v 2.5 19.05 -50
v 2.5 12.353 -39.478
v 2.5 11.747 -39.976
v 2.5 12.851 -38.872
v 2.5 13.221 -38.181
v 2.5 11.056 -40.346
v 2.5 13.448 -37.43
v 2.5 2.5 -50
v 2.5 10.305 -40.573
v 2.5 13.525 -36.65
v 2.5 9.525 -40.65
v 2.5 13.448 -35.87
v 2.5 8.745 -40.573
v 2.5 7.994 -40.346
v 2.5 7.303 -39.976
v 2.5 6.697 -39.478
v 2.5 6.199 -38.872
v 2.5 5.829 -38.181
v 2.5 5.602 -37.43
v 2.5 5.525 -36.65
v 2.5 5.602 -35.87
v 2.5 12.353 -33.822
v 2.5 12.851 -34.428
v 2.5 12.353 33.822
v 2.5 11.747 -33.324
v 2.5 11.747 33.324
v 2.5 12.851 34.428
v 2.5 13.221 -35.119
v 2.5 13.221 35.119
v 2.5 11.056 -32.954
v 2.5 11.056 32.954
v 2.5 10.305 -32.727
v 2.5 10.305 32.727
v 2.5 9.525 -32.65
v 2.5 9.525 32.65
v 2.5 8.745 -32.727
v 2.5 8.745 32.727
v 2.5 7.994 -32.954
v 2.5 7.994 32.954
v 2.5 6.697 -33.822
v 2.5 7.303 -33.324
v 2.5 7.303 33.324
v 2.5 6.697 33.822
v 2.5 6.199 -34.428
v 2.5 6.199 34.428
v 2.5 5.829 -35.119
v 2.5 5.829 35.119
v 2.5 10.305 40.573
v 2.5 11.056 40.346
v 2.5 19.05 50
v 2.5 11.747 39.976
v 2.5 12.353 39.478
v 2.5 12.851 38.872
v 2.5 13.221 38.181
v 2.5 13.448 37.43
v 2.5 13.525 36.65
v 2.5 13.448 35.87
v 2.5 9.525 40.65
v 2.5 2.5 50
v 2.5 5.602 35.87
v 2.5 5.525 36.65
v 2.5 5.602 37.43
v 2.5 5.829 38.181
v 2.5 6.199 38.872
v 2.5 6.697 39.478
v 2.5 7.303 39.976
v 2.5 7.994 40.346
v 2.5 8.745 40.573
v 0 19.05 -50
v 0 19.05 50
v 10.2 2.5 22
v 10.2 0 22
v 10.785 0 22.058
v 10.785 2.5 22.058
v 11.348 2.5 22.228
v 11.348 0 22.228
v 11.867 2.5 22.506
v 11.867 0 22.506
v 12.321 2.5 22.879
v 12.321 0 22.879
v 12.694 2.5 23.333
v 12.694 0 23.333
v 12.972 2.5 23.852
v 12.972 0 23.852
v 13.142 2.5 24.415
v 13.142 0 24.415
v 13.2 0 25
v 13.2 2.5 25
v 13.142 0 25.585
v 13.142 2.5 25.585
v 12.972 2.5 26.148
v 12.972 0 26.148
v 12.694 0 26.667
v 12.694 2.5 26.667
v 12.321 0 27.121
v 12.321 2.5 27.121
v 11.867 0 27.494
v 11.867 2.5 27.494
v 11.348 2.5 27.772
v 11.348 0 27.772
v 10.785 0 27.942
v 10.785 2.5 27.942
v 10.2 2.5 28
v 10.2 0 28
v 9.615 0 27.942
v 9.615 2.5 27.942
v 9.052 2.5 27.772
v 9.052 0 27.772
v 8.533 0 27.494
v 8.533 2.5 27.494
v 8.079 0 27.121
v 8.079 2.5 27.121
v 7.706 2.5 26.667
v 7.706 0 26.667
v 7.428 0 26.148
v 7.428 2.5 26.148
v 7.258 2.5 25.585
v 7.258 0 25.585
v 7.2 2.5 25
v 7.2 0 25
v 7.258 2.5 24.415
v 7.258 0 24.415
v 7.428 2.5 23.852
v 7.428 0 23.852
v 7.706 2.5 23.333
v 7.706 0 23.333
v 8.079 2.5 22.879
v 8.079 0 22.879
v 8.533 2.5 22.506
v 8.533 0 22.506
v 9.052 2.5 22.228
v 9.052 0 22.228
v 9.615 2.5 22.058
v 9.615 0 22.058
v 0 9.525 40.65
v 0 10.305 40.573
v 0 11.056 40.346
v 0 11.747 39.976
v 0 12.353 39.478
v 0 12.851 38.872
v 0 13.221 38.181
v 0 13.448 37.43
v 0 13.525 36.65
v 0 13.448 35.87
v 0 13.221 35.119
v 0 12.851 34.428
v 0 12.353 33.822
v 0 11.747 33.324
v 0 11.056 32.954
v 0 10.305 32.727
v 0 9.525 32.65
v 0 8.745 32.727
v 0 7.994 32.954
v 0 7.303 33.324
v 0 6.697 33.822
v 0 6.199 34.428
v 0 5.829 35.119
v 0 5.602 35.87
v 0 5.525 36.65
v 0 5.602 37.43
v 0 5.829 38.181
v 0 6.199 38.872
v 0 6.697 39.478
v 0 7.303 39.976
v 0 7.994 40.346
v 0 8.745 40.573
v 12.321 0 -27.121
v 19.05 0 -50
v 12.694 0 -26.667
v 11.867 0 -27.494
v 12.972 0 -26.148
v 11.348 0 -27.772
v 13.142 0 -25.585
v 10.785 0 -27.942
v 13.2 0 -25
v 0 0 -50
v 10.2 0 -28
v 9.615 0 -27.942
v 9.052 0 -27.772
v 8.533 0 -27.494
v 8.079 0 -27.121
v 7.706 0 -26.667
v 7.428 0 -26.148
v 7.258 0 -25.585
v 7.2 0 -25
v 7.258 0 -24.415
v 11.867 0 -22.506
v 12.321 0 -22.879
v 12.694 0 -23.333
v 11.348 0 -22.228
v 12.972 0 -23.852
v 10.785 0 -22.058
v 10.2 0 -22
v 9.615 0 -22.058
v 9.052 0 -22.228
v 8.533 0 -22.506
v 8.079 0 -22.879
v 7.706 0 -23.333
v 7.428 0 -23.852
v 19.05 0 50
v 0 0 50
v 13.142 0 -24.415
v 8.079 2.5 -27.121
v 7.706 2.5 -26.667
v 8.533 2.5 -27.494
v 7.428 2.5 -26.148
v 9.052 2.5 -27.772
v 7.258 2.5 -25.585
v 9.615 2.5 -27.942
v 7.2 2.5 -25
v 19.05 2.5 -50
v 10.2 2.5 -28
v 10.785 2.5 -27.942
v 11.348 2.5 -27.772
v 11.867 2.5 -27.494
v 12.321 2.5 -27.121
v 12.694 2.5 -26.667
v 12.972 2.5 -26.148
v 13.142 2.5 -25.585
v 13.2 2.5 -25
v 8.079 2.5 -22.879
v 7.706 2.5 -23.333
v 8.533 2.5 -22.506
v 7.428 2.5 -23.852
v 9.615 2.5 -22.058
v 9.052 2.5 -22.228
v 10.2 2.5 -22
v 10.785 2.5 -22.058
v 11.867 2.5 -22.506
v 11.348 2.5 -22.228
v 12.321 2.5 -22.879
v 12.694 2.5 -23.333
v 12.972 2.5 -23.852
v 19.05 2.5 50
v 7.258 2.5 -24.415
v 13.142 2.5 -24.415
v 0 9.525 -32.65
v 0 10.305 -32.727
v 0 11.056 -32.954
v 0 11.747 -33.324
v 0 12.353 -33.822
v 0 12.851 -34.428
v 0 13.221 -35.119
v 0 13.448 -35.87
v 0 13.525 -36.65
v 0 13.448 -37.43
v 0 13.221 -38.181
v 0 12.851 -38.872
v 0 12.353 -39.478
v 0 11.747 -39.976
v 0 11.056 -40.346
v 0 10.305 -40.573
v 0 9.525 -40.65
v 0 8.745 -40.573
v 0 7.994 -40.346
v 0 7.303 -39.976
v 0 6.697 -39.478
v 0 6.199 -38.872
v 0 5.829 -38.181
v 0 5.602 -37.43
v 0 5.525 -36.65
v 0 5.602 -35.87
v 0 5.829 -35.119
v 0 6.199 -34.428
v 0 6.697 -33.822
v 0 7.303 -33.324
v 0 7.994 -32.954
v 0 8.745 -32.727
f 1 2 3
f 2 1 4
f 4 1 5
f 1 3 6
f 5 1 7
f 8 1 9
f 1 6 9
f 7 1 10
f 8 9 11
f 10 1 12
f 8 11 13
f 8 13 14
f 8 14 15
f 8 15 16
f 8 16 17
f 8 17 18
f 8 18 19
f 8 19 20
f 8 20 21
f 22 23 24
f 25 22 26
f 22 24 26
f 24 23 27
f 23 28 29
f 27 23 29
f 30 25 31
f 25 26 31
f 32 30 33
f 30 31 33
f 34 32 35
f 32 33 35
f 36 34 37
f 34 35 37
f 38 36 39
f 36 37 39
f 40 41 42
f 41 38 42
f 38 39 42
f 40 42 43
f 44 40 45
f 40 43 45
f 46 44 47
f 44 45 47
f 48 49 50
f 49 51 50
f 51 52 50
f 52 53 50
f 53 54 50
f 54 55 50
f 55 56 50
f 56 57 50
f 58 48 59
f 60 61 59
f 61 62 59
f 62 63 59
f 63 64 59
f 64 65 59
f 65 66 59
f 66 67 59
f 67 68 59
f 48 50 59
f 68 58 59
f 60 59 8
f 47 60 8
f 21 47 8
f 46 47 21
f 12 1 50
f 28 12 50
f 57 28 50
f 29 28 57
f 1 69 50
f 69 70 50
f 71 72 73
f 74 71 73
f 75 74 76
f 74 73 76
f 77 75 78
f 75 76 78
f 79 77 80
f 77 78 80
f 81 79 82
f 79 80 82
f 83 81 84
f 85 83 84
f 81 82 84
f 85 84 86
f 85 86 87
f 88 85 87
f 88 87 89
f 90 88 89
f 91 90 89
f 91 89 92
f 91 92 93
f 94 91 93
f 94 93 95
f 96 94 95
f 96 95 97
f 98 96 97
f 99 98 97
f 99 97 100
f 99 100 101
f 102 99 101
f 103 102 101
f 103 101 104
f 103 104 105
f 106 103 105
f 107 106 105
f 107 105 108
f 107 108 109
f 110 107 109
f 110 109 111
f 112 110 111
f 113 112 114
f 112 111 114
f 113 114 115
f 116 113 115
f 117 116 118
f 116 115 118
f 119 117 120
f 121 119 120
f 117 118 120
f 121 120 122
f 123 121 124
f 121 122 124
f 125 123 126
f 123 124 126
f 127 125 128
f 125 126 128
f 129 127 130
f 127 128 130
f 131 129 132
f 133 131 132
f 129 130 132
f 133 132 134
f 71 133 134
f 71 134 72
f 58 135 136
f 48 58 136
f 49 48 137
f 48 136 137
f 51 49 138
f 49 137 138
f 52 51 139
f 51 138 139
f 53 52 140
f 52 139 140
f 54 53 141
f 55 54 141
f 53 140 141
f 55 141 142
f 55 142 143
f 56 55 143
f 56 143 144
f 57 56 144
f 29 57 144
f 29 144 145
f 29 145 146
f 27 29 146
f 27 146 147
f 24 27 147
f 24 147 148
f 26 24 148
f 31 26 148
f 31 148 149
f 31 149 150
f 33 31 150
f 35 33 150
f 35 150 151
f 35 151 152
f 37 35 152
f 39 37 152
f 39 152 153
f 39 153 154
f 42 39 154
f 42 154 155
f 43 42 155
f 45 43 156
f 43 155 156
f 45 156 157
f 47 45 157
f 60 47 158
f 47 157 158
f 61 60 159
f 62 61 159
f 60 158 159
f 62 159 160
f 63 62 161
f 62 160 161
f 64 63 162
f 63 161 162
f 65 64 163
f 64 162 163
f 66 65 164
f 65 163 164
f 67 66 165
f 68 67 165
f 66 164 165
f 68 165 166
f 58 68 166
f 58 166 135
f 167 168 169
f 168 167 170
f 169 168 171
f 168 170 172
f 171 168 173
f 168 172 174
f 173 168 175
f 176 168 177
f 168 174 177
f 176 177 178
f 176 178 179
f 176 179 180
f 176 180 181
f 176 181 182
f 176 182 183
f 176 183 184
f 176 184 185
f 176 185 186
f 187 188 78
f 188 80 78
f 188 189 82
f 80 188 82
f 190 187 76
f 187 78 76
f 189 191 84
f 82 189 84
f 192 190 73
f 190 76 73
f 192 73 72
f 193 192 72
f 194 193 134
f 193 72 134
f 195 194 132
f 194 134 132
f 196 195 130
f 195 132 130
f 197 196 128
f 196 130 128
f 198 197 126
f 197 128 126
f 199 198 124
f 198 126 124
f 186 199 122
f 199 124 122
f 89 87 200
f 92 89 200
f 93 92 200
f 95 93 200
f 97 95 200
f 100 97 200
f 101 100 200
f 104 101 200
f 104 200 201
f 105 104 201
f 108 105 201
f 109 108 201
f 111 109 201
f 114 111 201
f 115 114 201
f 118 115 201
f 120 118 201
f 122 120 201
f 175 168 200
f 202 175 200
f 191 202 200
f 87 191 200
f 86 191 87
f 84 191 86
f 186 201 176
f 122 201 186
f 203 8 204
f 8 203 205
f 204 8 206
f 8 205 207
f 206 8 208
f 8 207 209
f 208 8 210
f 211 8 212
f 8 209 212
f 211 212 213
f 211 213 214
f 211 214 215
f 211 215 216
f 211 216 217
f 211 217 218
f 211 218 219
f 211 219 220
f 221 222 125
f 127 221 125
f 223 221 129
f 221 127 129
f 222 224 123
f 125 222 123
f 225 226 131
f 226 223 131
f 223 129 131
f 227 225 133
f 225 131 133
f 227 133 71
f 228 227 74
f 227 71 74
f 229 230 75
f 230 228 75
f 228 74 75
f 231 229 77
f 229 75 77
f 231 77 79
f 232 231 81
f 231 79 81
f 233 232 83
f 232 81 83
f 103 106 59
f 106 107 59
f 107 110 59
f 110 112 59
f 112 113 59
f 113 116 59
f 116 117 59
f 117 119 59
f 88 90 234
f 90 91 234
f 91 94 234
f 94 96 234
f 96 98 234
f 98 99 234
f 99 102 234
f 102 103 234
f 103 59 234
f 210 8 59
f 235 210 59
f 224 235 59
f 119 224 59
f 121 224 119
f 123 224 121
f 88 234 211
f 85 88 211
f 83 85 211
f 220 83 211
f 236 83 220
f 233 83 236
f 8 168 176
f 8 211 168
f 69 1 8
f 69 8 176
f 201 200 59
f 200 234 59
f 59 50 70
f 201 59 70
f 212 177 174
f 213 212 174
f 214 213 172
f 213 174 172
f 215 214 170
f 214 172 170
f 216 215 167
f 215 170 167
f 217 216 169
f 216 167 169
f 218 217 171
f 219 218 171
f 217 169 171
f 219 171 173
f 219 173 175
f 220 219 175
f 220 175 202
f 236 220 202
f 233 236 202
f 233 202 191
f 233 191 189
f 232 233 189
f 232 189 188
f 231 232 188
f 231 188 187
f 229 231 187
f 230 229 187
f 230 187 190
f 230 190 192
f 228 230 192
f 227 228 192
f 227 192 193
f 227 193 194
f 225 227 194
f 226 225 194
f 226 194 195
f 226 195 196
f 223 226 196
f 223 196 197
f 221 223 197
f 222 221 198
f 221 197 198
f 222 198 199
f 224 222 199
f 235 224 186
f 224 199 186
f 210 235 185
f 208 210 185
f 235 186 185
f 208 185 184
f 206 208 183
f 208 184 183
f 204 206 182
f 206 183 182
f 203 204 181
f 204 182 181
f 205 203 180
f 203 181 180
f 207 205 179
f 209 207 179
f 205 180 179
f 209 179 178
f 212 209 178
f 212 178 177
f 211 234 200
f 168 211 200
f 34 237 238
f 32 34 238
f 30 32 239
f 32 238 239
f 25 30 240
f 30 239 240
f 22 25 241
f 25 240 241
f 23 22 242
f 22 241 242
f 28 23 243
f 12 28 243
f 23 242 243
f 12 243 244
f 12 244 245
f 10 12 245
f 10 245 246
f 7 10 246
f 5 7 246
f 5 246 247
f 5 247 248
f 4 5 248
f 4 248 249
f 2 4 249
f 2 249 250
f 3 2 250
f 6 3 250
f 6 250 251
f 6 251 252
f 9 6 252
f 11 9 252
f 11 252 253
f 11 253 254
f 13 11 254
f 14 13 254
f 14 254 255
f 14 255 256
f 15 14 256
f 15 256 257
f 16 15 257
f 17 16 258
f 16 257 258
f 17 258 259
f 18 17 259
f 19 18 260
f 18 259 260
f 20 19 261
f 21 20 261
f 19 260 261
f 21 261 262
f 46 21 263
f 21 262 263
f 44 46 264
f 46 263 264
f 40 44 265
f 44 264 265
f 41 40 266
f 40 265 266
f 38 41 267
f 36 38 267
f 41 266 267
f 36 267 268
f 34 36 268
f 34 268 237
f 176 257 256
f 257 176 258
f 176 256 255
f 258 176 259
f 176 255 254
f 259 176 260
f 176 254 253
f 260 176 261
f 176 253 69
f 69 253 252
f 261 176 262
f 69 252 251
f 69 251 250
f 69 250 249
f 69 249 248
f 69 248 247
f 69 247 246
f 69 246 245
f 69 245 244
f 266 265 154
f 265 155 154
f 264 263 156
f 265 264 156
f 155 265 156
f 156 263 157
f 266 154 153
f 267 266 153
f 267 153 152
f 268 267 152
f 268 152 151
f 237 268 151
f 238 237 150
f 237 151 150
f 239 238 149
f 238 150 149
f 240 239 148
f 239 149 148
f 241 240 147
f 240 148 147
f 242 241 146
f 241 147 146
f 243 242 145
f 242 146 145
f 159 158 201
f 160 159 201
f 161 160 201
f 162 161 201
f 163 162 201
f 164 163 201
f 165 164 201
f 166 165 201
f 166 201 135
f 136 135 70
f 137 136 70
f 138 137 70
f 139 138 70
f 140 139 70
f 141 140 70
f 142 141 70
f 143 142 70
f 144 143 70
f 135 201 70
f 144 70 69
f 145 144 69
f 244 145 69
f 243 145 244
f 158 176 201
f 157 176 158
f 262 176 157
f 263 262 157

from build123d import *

# Parameters (mm, degrees)
EXTRUDE_THIN1_DEPTH = 50
CUT_EXTRUDE2_REACH  = 58.796
SKETCH4_R           = 4
SKETCH5_R           = 3
CUT_EXTRUDE3_DEPTH  = 57.796170646


with BuildPart() as part:
    # Sketch1 → Extrude-Thin1 (new, symmetric)
    with BuildSketch(Plane.XY):
        Polygon((19.05, 0), (0, 0), (0, 19.05), (2.5, 19.05), (2.5, 2.5), (19.05, 2.5), align=None)
    extrude(amount=EXTRUDE_THIN1_DEPTH, both=True)

    # Sketch4 → Cut-Extrude2 (cut, up to next)
    with BuildSketch(Plane.ZY, mode=Mode.PRIVATE) as cut_extrude2_sk1:
        with Locations((-36.65, 9.525)):
            Circle(SKETCH4_R)
    cut_extrude2_tool1 = extrude(cut_extrude2_sk1.sketch, amount=-CUT_EXTRUDE2_REACH, mode=Mode.PRIVATE) & part.part
    # Sketch4 → Cut-Extrude2 (cut, up to next)
    with BuildSketch(Plane.ZY, mode=Mode.PRIVATE) as cut_extrude2_sk2:
        with Locations((36.65, 9.525)):
            Circle(SKETCH4_R)
    cut_extrude2_tool2 = extrude(cut_extrude2_sk2.sketch, amount=-CUT_EXTRUDE2_REACH, mode=Mode.PRIVATE) & part.part
    add(cut_extrude2_tool1.solids().sort_by_distance((0, 9.525, -36.65))[0], mode=Mode.SUBTRACT)
    add(cut_extrude2_tool2.solids().sort_by_distance((0, 9.525, 36.65))[0], mode=Mode.SUBTRACT)

    # Sketch5 → Cut-Extrude3 (cut, through all)
    with BuildSketch(Plane.XZ):
        with Locations(Location((10.2, 25, 0), (0, 0, 270))):
            Circle(SKETCH5_R)
        with Locations(Location((10.2, -25, 0), (0, 0, 270))):
            Circle(SKETCH5_R)
    extrude(amount=-CUT_EXTRUDE3_DEPTH, mode=Mode.SUBTRACT)


solid = part.part
